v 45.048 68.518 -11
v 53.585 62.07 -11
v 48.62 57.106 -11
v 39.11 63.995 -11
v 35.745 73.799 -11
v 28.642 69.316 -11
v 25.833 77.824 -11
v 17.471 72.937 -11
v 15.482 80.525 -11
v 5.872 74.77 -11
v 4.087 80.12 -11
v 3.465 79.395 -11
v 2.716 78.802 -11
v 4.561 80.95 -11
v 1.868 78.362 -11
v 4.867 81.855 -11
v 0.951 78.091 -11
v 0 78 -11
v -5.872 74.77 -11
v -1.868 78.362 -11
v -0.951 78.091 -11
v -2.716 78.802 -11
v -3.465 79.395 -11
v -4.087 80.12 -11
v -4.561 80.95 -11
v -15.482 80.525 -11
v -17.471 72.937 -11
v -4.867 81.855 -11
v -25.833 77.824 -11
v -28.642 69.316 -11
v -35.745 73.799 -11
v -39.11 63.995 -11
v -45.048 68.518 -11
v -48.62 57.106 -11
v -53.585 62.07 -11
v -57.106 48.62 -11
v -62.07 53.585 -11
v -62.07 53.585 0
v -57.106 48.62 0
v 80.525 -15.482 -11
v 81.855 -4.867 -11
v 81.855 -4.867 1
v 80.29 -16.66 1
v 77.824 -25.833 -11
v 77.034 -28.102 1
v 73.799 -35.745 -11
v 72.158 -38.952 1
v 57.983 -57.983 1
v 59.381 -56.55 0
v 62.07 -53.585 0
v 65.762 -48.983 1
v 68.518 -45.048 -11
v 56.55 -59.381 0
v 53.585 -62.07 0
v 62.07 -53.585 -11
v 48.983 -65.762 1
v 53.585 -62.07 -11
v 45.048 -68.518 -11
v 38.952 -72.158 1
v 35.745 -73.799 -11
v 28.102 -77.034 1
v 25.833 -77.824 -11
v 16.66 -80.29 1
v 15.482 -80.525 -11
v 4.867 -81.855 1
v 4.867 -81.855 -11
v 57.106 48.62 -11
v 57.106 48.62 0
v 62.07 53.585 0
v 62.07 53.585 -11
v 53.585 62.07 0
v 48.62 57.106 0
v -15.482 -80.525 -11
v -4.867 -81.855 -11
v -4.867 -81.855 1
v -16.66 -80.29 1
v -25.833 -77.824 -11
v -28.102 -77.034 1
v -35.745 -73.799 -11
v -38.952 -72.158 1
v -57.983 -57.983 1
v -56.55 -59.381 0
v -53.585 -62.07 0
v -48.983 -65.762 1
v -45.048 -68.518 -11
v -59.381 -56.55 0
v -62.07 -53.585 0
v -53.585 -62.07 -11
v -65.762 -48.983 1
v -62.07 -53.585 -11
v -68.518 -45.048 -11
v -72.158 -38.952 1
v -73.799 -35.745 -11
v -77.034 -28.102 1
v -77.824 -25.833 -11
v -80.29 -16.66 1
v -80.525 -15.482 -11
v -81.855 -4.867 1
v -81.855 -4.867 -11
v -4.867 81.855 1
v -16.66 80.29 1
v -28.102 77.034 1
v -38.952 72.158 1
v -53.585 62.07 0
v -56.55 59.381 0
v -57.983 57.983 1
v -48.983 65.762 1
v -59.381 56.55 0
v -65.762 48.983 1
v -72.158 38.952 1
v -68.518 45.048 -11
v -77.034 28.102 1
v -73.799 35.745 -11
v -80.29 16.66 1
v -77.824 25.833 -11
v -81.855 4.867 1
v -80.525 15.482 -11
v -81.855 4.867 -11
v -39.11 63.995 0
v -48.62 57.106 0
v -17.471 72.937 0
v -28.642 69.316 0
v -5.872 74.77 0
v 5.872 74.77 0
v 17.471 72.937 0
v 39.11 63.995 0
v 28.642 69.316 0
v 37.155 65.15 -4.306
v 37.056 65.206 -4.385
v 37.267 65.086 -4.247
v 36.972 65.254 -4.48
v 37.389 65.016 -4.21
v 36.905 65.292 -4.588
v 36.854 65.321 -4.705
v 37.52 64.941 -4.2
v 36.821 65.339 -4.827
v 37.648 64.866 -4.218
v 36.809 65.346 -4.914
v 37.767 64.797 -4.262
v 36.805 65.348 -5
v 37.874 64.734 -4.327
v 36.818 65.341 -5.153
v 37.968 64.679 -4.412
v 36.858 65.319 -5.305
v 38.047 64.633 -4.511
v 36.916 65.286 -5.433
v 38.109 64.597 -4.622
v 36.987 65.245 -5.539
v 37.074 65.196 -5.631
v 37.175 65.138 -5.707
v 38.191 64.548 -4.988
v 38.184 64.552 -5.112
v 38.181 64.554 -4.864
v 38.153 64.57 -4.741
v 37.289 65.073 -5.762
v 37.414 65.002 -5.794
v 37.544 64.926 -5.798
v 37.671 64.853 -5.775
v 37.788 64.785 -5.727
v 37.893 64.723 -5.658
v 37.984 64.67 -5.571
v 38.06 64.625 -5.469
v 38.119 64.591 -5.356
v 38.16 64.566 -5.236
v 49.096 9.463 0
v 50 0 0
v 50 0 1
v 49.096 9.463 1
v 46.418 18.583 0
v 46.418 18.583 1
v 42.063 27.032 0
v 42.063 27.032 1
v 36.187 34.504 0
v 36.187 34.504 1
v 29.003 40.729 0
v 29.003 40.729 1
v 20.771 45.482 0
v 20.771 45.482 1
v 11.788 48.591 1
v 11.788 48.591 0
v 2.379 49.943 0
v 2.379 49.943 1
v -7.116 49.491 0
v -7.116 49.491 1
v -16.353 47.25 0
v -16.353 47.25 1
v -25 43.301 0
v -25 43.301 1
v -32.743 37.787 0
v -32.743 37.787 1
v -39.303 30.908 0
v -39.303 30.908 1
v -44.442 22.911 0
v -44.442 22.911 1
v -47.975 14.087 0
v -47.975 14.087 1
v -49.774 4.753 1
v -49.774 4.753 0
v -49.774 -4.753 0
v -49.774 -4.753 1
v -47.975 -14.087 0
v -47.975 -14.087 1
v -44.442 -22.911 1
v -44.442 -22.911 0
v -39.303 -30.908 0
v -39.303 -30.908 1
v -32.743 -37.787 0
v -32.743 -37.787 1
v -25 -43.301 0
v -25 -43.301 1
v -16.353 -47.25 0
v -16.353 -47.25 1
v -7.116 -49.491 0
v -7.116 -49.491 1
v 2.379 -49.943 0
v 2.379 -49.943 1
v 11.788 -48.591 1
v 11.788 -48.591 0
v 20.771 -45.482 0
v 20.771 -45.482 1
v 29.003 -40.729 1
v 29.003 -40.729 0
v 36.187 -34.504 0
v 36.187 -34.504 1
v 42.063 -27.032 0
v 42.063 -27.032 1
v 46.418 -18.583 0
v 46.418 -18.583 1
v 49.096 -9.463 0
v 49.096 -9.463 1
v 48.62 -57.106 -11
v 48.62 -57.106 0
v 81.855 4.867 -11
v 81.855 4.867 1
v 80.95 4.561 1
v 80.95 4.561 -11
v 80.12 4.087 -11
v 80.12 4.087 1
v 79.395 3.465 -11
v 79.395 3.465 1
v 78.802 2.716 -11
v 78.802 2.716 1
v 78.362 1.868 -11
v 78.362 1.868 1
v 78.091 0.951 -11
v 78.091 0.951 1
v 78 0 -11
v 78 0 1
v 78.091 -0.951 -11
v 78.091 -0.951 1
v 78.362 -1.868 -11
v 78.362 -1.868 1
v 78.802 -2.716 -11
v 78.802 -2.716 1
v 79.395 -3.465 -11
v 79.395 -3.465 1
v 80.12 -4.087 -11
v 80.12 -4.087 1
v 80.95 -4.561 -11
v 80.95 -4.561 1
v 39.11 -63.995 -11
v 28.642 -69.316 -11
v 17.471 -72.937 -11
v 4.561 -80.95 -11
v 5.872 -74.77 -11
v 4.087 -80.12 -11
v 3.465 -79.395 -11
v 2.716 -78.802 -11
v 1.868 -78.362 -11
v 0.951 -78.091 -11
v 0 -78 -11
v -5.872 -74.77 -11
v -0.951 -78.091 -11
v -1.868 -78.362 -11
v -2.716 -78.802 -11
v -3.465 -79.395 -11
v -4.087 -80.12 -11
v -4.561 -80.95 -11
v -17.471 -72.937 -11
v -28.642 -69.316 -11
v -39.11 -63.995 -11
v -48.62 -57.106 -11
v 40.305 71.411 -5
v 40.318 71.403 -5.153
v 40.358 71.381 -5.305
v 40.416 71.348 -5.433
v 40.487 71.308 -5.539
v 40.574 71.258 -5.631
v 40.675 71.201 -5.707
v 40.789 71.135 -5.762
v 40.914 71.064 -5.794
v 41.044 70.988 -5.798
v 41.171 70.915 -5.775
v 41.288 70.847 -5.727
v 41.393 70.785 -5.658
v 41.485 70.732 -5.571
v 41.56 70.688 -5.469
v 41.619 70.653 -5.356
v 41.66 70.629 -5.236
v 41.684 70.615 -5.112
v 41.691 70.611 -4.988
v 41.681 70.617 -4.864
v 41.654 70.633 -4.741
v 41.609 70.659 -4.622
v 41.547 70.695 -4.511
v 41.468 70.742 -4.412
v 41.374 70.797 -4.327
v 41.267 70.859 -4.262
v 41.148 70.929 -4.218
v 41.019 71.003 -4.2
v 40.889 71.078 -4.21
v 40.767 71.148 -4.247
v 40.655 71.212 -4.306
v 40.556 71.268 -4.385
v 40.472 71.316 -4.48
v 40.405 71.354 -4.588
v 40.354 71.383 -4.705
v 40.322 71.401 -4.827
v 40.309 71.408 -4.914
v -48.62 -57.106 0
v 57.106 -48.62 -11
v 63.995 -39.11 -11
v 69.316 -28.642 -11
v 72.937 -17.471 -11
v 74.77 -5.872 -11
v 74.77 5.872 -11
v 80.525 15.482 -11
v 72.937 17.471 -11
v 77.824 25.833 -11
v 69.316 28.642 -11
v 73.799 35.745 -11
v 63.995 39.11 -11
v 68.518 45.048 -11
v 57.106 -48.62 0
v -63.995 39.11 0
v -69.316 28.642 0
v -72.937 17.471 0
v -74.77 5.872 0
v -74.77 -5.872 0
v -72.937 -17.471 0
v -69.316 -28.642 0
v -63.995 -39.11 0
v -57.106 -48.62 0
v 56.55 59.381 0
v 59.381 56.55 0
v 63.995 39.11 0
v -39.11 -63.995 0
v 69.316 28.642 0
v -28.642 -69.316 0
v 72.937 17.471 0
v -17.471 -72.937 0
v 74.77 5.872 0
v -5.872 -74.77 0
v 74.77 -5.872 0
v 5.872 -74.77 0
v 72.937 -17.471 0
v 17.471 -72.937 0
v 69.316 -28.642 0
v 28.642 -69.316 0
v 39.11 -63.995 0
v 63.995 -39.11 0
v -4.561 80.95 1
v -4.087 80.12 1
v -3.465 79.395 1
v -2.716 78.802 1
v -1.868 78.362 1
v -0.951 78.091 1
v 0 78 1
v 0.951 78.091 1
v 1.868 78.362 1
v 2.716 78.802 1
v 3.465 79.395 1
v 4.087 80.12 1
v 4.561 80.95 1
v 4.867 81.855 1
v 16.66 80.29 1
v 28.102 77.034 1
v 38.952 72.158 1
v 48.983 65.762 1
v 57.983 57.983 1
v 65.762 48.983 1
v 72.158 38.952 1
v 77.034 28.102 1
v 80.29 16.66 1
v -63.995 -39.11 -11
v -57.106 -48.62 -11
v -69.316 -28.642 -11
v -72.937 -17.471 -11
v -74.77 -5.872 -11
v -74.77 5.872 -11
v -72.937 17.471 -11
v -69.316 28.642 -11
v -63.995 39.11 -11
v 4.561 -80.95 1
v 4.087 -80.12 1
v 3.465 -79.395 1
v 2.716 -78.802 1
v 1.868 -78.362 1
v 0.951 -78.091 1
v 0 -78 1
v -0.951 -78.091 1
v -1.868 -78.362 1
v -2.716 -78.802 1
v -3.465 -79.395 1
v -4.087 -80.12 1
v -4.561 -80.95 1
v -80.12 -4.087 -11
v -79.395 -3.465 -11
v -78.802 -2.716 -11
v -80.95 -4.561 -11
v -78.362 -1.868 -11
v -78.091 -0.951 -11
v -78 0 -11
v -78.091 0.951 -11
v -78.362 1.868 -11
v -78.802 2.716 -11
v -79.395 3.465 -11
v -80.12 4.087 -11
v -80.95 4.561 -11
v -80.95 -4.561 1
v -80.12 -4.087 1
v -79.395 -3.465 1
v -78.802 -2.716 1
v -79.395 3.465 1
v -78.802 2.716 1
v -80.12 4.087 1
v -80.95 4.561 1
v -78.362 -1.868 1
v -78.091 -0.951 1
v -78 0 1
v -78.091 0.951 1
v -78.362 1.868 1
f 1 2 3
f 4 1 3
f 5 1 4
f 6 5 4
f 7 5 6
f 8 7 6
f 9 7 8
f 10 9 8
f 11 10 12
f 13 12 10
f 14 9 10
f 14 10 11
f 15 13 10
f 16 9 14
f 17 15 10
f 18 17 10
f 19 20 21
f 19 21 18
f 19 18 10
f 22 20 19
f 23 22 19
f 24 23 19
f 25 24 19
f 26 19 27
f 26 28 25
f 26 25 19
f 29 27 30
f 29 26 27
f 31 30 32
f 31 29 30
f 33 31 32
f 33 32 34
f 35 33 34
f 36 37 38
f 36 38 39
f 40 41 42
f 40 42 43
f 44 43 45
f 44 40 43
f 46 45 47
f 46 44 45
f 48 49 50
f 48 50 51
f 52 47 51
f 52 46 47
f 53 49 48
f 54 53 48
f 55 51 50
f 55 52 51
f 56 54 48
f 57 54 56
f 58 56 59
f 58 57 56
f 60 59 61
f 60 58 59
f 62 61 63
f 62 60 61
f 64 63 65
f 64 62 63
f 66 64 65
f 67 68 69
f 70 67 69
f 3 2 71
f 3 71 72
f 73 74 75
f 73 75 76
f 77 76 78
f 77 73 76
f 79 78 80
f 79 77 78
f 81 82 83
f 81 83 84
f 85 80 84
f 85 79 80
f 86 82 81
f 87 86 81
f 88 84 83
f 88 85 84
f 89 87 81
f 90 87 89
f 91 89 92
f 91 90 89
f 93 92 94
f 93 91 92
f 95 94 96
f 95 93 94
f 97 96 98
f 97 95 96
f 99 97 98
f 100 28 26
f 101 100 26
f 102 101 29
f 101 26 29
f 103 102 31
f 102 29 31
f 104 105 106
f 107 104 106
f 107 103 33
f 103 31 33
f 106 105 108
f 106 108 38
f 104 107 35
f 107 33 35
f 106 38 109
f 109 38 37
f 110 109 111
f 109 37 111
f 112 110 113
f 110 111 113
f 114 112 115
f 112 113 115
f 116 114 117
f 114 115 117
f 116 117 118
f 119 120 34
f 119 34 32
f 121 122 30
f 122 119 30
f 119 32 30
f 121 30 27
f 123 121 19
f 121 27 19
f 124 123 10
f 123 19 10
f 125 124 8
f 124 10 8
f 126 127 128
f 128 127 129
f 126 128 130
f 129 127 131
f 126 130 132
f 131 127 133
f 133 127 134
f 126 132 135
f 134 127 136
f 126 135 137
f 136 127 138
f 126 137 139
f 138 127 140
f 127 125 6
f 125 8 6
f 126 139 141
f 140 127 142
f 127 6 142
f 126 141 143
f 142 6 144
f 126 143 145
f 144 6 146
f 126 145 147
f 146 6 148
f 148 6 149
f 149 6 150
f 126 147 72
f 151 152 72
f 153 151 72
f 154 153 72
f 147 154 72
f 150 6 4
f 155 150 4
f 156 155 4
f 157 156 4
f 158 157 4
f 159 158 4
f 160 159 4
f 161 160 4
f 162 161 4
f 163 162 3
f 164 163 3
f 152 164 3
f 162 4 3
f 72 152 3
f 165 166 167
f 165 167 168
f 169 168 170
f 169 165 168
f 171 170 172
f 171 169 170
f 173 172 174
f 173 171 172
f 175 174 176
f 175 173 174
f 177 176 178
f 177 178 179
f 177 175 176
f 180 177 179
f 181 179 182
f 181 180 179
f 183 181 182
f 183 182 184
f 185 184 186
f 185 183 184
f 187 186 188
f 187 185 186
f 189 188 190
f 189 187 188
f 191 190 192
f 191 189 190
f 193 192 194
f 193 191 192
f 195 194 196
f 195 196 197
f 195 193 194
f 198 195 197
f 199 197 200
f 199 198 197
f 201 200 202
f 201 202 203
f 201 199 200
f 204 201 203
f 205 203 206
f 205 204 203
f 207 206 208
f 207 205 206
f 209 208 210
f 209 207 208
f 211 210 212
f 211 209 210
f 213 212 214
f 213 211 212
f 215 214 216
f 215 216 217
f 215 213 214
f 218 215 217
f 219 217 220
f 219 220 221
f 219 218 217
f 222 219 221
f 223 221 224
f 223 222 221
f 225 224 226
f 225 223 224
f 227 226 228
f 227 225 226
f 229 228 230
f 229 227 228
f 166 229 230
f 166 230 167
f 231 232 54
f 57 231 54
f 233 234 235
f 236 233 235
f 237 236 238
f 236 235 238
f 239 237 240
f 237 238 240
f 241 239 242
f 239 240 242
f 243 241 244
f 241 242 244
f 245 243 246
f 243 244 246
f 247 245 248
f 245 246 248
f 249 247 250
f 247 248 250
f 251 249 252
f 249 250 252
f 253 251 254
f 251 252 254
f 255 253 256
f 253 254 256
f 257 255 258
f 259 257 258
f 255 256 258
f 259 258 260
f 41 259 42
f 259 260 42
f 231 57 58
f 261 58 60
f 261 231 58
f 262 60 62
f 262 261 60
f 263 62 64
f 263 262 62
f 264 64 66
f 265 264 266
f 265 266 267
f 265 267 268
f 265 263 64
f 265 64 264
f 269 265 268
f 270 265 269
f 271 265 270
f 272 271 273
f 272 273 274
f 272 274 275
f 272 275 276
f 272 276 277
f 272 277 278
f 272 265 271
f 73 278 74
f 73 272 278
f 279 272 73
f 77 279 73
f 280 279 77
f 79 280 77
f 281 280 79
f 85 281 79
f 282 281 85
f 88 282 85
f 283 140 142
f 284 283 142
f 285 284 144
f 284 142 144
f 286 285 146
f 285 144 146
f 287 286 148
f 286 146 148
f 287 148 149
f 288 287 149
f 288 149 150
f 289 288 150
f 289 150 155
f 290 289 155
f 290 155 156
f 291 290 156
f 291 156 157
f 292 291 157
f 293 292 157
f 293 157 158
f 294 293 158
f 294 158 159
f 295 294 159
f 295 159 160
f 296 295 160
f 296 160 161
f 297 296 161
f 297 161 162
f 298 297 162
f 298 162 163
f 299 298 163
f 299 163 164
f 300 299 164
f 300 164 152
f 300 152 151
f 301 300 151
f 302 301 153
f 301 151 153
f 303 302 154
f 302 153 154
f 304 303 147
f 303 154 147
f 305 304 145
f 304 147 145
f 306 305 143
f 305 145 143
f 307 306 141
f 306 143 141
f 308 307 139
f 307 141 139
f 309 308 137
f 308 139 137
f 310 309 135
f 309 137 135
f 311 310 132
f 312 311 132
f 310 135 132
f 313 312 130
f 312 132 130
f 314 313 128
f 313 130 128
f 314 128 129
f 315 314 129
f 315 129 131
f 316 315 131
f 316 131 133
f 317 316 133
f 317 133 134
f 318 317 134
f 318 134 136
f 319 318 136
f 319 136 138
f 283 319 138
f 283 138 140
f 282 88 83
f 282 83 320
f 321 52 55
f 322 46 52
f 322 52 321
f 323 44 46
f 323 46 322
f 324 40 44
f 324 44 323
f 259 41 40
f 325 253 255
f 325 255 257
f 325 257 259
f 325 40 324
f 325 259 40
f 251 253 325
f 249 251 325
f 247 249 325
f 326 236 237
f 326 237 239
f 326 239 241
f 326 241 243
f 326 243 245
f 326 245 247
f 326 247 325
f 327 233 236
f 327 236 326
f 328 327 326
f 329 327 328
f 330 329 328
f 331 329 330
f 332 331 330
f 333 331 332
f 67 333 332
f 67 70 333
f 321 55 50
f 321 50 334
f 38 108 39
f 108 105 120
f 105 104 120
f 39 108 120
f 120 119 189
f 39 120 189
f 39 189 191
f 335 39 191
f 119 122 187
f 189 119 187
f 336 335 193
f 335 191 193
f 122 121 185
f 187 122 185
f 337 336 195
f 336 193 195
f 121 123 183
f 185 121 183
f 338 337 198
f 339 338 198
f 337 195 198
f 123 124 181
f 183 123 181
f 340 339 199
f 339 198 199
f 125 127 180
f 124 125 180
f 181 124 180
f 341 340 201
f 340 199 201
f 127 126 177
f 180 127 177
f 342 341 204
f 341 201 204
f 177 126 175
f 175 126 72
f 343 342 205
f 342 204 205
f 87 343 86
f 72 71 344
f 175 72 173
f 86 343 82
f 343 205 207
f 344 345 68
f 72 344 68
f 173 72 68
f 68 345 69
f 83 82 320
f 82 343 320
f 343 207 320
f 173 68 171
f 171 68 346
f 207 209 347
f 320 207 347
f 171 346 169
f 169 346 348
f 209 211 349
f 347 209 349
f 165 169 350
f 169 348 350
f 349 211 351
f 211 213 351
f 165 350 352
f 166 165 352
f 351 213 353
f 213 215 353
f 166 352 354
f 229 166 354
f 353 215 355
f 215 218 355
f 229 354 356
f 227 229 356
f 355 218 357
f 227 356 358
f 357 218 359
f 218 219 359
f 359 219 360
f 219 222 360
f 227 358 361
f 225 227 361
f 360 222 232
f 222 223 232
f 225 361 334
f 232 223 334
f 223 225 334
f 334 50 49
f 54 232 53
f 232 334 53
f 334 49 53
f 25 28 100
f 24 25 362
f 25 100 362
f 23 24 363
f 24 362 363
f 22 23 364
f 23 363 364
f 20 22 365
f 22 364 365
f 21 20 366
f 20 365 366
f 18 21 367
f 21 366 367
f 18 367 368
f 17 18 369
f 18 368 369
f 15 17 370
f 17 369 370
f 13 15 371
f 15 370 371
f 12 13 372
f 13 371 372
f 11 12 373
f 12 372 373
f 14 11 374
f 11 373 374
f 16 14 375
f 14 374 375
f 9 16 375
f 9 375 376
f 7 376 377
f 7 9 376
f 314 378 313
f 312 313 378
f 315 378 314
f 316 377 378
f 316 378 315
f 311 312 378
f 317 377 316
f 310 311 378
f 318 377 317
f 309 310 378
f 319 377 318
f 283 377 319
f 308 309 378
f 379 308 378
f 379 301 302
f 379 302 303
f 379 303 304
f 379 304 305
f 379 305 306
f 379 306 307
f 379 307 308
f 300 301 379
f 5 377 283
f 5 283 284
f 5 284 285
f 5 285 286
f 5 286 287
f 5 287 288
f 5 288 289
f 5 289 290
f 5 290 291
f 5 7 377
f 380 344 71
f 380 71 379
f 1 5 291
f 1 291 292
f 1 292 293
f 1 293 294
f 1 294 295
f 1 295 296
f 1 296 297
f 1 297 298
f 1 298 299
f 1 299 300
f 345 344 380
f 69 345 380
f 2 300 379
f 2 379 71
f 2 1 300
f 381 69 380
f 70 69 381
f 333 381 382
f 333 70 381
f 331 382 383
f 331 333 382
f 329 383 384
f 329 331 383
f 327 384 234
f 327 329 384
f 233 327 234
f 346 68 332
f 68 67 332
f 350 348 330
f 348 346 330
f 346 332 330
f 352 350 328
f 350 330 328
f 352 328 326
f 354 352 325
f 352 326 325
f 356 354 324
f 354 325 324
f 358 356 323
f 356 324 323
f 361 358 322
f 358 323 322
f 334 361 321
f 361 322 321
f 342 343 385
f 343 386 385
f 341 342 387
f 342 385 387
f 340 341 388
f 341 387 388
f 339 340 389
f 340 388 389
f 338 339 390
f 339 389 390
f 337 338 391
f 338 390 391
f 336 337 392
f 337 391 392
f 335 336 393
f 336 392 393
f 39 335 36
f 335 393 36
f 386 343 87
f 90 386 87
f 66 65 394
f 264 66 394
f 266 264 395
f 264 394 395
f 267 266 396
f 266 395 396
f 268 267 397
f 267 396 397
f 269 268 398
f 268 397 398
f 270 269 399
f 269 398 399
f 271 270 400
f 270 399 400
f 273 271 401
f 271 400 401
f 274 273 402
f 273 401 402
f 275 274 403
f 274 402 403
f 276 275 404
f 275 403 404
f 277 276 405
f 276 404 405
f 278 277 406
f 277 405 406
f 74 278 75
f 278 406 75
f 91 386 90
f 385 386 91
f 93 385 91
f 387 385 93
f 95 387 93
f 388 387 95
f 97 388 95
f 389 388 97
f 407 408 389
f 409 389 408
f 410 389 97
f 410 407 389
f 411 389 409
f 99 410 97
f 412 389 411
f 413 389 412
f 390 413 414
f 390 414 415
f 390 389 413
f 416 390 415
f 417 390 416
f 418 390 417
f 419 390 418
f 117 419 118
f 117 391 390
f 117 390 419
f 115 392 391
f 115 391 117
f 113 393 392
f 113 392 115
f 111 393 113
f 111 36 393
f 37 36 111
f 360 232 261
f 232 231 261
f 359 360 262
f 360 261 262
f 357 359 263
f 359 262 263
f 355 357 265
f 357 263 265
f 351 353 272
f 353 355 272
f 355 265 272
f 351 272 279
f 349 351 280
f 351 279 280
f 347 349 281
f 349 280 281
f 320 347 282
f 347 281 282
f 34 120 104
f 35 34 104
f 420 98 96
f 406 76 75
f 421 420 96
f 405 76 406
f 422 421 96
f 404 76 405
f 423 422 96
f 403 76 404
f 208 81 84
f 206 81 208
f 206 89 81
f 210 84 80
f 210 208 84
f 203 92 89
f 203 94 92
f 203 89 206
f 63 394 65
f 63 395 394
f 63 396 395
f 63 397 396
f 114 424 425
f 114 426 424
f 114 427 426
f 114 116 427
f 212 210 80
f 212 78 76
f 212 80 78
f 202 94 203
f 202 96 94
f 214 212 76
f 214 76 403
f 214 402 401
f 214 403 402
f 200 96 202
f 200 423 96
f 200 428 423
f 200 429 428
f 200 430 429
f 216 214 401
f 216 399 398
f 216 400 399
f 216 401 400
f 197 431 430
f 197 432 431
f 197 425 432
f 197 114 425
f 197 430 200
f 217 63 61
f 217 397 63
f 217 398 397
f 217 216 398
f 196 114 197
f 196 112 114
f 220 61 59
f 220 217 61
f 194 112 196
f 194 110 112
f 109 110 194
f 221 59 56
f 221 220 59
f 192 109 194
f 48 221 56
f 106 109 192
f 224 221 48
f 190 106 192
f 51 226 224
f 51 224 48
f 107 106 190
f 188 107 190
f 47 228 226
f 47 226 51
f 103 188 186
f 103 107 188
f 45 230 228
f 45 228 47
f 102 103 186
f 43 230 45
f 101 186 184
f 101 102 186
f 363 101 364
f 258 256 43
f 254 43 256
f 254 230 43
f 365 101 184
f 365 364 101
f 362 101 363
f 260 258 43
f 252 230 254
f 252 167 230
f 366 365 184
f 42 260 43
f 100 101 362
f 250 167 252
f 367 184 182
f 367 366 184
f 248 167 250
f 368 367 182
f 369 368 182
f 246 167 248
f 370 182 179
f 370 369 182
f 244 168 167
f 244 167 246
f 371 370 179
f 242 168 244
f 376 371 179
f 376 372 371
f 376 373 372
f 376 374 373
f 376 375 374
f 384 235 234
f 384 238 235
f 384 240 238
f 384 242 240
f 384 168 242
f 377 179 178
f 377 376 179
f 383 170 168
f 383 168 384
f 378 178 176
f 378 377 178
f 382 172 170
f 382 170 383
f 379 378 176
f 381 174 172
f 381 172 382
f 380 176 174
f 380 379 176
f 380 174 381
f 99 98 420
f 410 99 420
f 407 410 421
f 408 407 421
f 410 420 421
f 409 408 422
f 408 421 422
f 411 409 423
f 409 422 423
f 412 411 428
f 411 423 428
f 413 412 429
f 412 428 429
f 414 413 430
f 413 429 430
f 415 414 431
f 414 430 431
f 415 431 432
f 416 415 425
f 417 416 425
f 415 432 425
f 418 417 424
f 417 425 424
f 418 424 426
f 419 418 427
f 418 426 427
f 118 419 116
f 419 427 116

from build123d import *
from build123d.topology import SkipClean

# Parameters (mm, degrees)
SKETCH1_R                 = 82
SKETCH1_R_2               = 50
BOSS_EXTRUDE1_DEPTH       = 1
BOSS_EXTRUDE3_START       = 11
SKETCH3_R                 = 82
SKETCH3_R_2               = 75
BOSS_EXTRUDE3_DEPTH       = 11
SKETCH4_R                 = 5
CUT_EXTRUDE1_DEPTH        = 117.584733134
CIRPATTERN1_COUNT         = 4
CUT_EXTRUDE3_DEPTH        = 11
CIRPATTERN3_COUNT         = 4
M2X0_4_TAPPED_HOLE1_D     = 1.6
M2X0_4_TAPPED_HOLE1_DEPTH = 10
M2X0_4_TAPPED_HOLE1_TIP   = 0.480688495


with BuildPart() as part:
    # Sketch1 → Boss-Extrude1 (new body)
    with BuildSketch(Plane.XY):
        Circle(SKETCH1_R)
        Circle(SKETCH1_R_2, mode=Mode.SUBTRACT)
    extrude(amount=BOSS_EXTRUDE1_DEPTH)

    # Sketch3 → Boss-Extrude3 (add)
    with BuildSketch(Plane(origin=(0, 0, 0), x_dir=(-1, 0, 0), z_dir=(0, 0, -1)).offset(BOSS_EXTRUDE3_START)):
        Circle(SKETCH3_R)
        Circle(SKETCH3_R_2, mode=Mode.SUBTRACT)
    extrude(amount=-BOSS_EXTRUDE3_DEPTH)

    # Sketch4 → Cut-Extrude1 (cut, through all)
    with SkipClean():  # the faces are left unmerged after this step: merging them gives an invalid solid
        with BuildSketch(Plane.XY.offset(1)):
            with Locations((0, 83)):
                Circle(SKETCH4_R)
        cut_extrude1 = extrude(amount=-CUT_EXTRUDE1_DEPTH, mode=Mode.SUBTRACT)

    # CirPattern1: Cut-Extrude1 ×4 about axis
    cirpattern1_axis = Axis((0, 0, 0), (0, 0, 1))
    for i in range(1, CIRPATTERN1_COUNT):
        add(cut_extrude1.rotate(cirpattern1_axis, i * 360 / CIRPATTERN1_COUNT), mode=Mode.SUBTRACT)

    # Sketch6 → Cut-Extrude3 (cut)
    with BuildSketch(Plane(origin=(0, 0, -11), x_dir=(-1, 0, 0), z_dir=(0, 0, -1))):
        Polygon((38.066313572, 46.551594946), (59.467914625, 67.953195999), (67.882250994, 59.39696962), (46.551594946, 38.066313572), align=None)
    cut_extrude3 = extrude(amount=-CUT_EXTRUDE3_DEPTH, mode=Mode.SUBTRACT)

    # CirPattern3: Cut-Extrude3 ×4 about axis
    cirpattern3_axis = Axis((0, 0, 0), (0, 0, 1))
    for i in range(1, CIRPATTERN3_COUNT):
        add(cut_extrude3.rotate(cirpattern3_axis, i * 360 / CIRPATTERN3_COUNT), mode=Mode.SUBTRACT)

    # M2x0.4 Tapped Hole1
    with Locations(Plane(origin=(41.000000001, 71.01408311, -5), x_dir=(0.86602540378, -0.500000000007, 0), z_dir=(0.500000000007, 0.86602540378, 0))):
        with Locations((0, 0)):
            Hole(M2X0_4_TAPPED_HOLE1_D / 2, depth=M2X0_4_TAPPED_HOLE1_DEPTH)
            with Locations((0, 0, -(M2X0_4_TAPPED_HOLE1_DEPTH + M2X0_4_TAPPED_HOLE1_TIP / 2))):  # 118° drill point
                Cone(0, M2X0_4_TAPPED_HOLE1_D / 2, M2X0_4_TAPPED_HOLE1_TIP, mode=Mode.SUBTRACT)


solid = part.part
